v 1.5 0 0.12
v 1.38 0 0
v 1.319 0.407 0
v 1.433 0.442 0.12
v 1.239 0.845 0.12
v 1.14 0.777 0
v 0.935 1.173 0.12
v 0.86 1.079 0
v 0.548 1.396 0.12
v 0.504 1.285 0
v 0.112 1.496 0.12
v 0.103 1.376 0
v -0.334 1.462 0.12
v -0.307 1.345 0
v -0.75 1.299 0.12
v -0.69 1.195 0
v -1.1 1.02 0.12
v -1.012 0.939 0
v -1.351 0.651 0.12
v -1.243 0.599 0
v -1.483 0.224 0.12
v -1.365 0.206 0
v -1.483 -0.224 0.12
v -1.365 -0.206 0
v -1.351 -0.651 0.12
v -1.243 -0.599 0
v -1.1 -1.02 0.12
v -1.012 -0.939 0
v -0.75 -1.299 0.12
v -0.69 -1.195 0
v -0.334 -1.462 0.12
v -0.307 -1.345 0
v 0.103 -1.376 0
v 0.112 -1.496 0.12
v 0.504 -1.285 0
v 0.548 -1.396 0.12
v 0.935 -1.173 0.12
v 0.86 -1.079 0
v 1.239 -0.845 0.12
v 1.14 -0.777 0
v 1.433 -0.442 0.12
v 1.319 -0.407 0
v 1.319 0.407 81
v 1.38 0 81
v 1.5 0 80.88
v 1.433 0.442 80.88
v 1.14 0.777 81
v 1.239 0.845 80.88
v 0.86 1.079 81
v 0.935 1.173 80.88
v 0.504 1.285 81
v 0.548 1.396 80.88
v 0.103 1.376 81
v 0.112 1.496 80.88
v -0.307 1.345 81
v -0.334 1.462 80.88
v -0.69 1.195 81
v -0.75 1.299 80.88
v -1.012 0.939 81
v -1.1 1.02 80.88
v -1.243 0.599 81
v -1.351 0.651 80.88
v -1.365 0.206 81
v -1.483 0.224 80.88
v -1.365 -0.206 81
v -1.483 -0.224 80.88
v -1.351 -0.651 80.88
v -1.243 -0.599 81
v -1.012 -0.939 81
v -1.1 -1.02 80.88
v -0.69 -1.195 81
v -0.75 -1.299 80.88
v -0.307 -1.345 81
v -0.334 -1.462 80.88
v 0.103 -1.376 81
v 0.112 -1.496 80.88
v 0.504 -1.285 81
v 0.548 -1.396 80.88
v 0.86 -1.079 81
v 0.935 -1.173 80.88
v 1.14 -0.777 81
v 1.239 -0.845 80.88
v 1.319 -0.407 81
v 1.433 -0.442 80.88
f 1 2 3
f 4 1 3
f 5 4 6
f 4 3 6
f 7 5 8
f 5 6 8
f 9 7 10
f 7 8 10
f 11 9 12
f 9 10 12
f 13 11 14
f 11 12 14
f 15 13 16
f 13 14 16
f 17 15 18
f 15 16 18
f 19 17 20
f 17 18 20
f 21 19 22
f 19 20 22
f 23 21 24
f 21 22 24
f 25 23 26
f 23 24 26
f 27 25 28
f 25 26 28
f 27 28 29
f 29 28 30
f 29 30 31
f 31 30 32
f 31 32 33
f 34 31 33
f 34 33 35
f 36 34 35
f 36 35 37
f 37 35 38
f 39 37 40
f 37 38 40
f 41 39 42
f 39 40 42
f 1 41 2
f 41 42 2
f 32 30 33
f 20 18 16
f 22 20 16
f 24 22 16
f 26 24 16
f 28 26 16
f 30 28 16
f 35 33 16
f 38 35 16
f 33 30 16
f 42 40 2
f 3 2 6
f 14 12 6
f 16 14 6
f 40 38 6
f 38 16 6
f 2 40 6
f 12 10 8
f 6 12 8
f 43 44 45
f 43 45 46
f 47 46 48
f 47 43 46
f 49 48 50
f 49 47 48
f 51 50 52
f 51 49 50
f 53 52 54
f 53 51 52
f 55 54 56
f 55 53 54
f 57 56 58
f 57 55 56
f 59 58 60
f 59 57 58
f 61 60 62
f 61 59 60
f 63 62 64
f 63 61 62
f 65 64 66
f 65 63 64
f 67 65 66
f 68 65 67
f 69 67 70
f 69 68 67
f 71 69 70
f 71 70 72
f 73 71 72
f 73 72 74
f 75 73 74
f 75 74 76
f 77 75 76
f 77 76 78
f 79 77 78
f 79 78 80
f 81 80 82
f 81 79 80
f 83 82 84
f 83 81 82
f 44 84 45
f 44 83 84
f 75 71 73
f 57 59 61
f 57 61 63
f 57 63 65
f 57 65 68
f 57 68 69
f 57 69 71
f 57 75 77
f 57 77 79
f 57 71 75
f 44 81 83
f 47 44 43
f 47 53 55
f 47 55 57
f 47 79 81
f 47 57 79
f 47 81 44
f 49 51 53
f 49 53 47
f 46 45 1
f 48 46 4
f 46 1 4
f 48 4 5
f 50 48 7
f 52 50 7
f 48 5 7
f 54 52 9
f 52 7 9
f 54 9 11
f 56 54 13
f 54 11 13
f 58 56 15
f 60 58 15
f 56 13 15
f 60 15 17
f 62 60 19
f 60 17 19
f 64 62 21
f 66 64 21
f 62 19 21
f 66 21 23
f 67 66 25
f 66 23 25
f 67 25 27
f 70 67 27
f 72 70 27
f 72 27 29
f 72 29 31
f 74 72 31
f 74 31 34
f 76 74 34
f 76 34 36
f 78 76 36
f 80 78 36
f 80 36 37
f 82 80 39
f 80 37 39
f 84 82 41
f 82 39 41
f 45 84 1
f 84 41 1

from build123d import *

# Parameters (mm, degrees)
SKETCH_1_R      = 2.5
EXTRUDE_1_DEPTH = 135
CHAMFER_1_SIZE  = 0.2
SCALE_1_SCALE   = 0.6


with BuildPart() as part:
    # 草图1 → 凸台-拉伸1 (new body)
    with BuildSketch(Plane.XY):
        Circle(SKETCH_1_R)
    extrude(amount=EXTRUDE_1_DEPTH)

    # 倒角1
    chamfer_1_edges = [part.edges().sort_by_distance(p)[0] for p in [
        (-2.5, 0, 0),
        (-2.5, 0, 135),
    ]]
    chamfer(chamfer_1_edges, length=CHAMFER_1_SIZE)


with BuildPart() as part_1:
    # 缩放比例1: scaled about (0, 0, 0)
    add(part.part.scale(SCALE_1_SCALE))


solid = part_1.part
